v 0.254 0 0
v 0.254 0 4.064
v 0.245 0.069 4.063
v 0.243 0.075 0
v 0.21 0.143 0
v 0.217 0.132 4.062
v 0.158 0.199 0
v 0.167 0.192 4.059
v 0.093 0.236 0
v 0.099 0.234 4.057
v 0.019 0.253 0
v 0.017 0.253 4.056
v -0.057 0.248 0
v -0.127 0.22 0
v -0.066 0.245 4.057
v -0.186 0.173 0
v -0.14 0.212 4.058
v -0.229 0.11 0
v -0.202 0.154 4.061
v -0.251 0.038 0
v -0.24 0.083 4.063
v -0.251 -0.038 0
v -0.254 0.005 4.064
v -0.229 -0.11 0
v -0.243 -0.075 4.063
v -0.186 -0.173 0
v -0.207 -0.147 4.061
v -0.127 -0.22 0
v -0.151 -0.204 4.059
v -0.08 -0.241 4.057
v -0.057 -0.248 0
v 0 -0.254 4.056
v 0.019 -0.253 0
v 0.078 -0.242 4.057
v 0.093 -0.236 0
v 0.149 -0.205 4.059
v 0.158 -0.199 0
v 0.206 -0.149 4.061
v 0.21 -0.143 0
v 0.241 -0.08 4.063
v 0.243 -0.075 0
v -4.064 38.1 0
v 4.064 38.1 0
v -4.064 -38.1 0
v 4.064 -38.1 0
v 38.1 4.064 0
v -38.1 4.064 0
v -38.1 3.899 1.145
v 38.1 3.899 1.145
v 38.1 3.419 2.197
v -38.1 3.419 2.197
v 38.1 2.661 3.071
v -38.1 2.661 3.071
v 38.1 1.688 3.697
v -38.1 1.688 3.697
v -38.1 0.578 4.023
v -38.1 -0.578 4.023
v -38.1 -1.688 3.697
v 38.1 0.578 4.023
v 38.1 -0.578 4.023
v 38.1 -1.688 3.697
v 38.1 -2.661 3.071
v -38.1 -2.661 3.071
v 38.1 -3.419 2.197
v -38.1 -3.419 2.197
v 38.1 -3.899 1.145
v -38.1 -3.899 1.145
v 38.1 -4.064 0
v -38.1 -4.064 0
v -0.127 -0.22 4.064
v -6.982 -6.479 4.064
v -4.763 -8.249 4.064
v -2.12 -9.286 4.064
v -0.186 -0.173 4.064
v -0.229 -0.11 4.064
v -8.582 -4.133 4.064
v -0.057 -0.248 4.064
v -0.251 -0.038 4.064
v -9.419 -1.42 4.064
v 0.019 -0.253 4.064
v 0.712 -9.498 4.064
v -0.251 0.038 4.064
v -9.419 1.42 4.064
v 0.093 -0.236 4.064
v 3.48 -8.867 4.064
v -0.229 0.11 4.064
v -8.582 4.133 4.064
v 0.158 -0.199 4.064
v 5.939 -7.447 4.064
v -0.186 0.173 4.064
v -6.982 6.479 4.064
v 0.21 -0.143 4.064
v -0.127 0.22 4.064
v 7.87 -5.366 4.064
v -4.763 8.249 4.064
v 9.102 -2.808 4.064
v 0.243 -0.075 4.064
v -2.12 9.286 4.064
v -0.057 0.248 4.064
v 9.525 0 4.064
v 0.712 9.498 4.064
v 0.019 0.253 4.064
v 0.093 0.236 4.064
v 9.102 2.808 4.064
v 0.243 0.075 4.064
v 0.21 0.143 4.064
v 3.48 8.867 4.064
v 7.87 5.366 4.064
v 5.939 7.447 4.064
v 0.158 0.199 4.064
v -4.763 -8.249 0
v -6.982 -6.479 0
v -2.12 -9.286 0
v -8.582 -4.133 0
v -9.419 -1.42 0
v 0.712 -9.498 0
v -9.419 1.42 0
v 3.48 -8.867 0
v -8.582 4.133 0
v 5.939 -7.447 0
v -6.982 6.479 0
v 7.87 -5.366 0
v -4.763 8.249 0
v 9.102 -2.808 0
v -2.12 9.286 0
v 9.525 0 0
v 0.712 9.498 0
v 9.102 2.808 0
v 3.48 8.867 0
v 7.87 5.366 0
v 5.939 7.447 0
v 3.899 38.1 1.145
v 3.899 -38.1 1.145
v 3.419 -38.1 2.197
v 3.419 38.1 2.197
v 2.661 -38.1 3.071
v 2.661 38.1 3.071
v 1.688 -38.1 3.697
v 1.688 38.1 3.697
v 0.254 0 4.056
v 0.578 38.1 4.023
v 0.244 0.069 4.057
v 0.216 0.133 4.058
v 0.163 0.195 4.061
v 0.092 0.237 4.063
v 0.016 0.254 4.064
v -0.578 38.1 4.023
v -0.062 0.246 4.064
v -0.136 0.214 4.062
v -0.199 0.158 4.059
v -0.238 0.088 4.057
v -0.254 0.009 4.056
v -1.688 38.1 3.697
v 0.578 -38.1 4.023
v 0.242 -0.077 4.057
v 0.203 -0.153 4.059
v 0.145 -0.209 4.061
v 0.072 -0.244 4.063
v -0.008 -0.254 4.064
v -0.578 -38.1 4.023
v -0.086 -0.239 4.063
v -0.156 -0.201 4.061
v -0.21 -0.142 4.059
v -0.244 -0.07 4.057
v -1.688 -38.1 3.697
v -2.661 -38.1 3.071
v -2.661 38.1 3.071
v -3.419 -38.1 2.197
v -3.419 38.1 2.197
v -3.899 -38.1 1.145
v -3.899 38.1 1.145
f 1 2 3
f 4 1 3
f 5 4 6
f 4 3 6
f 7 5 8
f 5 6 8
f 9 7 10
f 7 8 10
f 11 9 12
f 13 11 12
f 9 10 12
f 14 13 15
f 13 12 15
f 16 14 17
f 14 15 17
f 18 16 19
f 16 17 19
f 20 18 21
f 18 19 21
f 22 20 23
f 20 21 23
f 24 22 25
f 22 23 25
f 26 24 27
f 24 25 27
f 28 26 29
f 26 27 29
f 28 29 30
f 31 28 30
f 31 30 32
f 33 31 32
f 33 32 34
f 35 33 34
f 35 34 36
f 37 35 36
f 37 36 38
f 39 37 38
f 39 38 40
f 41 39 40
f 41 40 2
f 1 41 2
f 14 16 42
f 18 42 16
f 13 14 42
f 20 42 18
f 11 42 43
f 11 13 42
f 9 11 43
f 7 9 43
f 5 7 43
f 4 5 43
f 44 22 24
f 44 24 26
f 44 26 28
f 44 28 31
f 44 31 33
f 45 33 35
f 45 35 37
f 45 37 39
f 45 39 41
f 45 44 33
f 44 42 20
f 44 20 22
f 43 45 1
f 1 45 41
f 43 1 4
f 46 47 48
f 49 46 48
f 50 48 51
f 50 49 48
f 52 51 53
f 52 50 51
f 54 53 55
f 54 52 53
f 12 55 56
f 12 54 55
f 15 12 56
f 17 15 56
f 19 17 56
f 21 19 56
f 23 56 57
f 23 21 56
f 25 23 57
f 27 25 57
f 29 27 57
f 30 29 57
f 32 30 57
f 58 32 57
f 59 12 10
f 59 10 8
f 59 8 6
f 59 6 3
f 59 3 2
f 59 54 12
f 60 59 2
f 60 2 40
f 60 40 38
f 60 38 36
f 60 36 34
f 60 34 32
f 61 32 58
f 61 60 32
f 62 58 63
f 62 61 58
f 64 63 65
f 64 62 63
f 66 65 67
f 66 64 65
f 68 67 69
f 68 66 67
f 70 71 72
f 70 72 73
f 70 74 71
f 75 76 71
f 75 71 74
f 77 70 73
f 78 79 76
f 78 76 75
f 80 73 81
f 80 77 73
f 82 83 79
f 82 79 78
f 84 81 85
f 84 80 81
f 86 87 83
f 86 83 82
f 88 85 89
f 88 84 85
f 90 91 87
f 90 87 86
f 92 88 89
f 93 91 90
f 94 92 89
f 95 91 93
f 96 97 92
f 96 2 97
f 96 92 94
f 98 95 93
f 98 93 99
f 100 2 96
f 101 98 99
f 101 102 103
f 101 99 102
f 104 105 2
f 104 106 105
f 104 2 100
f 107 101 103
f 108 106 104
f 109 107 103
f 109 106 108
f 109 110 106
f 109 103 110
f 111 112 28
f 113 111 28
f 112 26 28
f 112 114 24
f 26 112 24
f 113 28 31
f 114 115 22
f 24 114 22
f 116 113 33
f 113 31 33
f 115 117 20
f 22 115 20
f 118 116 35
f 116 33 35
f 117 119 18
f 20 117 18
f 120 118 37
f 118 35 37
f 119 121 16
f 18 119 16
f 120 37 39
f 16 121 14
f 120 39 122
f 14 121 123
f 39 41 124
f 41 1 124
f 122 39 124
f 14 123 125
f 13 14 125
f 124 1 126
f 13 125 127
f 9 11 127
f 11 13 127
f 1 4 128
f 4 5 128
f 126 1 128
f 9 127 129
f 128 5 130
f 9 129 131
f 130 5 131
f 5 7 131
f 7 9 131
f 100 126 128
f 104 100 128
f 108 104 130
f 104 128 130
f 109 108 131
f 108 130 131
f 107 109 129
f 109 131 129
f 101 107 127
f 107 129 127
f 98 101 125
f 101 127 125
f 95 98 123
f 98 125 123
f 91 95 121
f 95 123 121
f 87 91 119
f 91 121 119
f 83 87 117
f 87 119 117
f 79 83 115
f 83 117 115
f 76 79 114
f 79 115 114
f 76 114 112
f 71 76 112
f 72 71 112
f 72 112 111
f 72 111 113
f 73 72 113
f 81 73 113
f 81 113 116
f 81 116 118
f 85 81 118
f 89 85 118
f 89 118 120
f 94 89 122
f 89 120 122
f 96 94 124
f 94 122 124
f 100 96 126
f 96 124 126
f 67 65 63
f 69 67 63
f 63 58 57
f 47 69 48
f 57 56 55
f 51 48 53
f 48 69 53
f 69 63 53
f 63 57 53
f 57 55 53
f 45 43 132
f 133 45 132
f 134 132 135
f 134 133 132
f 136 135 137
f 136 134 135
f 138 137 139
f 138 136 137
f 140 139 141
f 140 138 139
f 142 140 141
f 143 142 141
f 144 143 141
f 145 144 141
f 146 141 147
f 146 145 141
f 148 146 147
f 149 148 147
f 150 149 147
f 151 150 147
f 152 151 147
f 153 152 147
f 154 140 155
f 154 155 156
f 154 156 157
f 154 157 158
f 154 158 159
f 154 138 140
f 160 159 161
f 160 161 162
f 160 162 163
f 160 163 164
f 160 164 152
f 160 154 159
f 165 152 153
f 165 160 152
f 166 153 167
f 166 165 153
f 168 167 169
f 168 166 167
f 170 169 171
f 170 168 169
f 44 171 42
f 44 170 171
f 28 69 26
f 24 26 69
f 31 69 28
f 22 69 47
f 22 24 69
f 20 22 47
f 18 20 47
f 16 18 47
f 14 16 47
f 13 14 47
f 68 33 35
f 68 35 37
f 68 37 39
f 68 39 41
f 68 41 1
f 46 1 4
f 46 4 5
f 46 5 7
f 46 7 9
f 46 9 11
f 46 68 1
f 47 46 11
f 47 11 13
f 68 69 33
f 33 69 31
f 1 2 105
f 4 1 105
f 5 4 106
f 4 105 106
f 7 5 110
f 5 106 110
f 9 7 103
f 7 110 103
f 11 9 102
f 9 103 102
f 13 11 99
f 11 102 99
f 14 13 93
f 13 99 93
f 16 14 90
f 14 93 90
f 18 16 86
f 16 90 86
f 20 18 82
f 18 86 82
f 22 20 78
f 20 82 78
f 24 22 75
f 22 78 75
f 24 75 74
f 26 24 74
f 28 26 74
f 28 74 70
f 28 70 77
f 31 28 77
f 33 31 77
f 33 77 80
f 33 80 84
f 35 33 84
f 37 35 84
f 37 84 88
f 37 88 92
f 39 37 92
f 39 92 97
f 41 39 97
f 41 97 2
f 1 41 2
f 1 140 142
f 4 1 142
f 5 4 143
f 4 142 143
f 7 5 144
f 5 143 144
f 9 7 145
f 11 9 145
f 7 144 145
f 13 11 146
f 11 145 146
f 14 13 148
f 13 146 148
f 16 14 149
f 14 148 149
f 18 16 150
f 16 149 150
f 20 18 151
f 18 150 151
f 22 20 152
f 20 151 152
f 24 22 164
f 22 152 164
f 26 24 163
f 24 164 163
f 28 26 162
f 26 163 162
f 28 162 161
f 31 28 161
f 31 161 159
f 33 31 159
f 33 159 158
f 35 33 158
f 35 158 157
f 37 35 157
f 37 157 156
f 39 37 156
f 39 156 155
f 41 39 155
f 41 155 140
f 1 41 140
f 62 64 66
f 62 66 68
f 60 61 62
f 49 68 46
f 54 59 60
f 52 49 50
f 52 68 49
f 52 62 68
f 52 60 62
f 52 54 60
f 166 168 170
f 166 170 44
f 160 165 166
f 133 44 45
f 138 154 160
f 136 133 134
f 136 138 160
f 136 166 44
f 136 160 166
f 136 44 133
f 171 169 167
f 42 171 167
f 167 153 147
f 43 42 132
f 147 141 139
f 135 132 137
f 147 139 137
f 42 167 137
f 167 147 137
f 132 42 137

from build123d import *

# Parameters (mm, degrees)
F3_DEPTH = 38.1
F4_DEPTH = 38.1
F0_R     = 9.525
F5_DEPTH = 4.064
F6_R     = 0.254
F7_DEPTH = 25.4


with BuildPart() as f3:
    # F2 (on Front) → F3 (new body, symmetric)
    with BuildSketch(Plane.XZ):
        with BuildLine():
            ThreePointArc((4.064, 0), (0, 4.064), (-4.064, 0))
            Line((-4.064, 0), (4.064, 0))
        make_face()
    extrude(amount=F3_DEPTH, both=True)


with BuildPart() as f4:
    # F1 (on Right) → F4 (new body, symmetric)
    with BuildSketch(Plane.YZ):
        with BuildLine():
            Line((-4.064, 0), (4.064, 0))
            ThreePointArc((4.064, 0), (0, 4.064), (-4.064, 0))
        make_face()
    extrude(amount=F4_DEPTH, both=True)


with BuildPart() as f5:
    # F0 (on Top) → F5 (new body)
    with BuildSketch(Plane.XY):
        Circle(F0_R)
    extrude(amount=F5_DEPTH)


with BuildPart() as f7_tool:
    # F6 (on face) → F7 (new body)
    with BuildSketch(Plane.XY.offset(4.064)):
        Circle(F6_R)
    extrude(amount=-F7_DEPTH)


with BuildPart() as f3_1:
    add(f3.part)

    # F7: cut by f7_tool
    add(f7_tool.part, mode=Mode.SUBTRACT)


with BuildPart() as f4_1:
    add(f4.part)

    # F7: cut by f7_tool
    add(f7_tool.part, mode=Mode.SUBTRACT)


with BuildPart() as f5_1:
    add(f5.part)

    # F7: cut by f7_tool
    add(f7_tool.part, mode=Mode.SUBTRACT)


solid = Compound([f3_1.part, f4_1.part, f5_1.part])
